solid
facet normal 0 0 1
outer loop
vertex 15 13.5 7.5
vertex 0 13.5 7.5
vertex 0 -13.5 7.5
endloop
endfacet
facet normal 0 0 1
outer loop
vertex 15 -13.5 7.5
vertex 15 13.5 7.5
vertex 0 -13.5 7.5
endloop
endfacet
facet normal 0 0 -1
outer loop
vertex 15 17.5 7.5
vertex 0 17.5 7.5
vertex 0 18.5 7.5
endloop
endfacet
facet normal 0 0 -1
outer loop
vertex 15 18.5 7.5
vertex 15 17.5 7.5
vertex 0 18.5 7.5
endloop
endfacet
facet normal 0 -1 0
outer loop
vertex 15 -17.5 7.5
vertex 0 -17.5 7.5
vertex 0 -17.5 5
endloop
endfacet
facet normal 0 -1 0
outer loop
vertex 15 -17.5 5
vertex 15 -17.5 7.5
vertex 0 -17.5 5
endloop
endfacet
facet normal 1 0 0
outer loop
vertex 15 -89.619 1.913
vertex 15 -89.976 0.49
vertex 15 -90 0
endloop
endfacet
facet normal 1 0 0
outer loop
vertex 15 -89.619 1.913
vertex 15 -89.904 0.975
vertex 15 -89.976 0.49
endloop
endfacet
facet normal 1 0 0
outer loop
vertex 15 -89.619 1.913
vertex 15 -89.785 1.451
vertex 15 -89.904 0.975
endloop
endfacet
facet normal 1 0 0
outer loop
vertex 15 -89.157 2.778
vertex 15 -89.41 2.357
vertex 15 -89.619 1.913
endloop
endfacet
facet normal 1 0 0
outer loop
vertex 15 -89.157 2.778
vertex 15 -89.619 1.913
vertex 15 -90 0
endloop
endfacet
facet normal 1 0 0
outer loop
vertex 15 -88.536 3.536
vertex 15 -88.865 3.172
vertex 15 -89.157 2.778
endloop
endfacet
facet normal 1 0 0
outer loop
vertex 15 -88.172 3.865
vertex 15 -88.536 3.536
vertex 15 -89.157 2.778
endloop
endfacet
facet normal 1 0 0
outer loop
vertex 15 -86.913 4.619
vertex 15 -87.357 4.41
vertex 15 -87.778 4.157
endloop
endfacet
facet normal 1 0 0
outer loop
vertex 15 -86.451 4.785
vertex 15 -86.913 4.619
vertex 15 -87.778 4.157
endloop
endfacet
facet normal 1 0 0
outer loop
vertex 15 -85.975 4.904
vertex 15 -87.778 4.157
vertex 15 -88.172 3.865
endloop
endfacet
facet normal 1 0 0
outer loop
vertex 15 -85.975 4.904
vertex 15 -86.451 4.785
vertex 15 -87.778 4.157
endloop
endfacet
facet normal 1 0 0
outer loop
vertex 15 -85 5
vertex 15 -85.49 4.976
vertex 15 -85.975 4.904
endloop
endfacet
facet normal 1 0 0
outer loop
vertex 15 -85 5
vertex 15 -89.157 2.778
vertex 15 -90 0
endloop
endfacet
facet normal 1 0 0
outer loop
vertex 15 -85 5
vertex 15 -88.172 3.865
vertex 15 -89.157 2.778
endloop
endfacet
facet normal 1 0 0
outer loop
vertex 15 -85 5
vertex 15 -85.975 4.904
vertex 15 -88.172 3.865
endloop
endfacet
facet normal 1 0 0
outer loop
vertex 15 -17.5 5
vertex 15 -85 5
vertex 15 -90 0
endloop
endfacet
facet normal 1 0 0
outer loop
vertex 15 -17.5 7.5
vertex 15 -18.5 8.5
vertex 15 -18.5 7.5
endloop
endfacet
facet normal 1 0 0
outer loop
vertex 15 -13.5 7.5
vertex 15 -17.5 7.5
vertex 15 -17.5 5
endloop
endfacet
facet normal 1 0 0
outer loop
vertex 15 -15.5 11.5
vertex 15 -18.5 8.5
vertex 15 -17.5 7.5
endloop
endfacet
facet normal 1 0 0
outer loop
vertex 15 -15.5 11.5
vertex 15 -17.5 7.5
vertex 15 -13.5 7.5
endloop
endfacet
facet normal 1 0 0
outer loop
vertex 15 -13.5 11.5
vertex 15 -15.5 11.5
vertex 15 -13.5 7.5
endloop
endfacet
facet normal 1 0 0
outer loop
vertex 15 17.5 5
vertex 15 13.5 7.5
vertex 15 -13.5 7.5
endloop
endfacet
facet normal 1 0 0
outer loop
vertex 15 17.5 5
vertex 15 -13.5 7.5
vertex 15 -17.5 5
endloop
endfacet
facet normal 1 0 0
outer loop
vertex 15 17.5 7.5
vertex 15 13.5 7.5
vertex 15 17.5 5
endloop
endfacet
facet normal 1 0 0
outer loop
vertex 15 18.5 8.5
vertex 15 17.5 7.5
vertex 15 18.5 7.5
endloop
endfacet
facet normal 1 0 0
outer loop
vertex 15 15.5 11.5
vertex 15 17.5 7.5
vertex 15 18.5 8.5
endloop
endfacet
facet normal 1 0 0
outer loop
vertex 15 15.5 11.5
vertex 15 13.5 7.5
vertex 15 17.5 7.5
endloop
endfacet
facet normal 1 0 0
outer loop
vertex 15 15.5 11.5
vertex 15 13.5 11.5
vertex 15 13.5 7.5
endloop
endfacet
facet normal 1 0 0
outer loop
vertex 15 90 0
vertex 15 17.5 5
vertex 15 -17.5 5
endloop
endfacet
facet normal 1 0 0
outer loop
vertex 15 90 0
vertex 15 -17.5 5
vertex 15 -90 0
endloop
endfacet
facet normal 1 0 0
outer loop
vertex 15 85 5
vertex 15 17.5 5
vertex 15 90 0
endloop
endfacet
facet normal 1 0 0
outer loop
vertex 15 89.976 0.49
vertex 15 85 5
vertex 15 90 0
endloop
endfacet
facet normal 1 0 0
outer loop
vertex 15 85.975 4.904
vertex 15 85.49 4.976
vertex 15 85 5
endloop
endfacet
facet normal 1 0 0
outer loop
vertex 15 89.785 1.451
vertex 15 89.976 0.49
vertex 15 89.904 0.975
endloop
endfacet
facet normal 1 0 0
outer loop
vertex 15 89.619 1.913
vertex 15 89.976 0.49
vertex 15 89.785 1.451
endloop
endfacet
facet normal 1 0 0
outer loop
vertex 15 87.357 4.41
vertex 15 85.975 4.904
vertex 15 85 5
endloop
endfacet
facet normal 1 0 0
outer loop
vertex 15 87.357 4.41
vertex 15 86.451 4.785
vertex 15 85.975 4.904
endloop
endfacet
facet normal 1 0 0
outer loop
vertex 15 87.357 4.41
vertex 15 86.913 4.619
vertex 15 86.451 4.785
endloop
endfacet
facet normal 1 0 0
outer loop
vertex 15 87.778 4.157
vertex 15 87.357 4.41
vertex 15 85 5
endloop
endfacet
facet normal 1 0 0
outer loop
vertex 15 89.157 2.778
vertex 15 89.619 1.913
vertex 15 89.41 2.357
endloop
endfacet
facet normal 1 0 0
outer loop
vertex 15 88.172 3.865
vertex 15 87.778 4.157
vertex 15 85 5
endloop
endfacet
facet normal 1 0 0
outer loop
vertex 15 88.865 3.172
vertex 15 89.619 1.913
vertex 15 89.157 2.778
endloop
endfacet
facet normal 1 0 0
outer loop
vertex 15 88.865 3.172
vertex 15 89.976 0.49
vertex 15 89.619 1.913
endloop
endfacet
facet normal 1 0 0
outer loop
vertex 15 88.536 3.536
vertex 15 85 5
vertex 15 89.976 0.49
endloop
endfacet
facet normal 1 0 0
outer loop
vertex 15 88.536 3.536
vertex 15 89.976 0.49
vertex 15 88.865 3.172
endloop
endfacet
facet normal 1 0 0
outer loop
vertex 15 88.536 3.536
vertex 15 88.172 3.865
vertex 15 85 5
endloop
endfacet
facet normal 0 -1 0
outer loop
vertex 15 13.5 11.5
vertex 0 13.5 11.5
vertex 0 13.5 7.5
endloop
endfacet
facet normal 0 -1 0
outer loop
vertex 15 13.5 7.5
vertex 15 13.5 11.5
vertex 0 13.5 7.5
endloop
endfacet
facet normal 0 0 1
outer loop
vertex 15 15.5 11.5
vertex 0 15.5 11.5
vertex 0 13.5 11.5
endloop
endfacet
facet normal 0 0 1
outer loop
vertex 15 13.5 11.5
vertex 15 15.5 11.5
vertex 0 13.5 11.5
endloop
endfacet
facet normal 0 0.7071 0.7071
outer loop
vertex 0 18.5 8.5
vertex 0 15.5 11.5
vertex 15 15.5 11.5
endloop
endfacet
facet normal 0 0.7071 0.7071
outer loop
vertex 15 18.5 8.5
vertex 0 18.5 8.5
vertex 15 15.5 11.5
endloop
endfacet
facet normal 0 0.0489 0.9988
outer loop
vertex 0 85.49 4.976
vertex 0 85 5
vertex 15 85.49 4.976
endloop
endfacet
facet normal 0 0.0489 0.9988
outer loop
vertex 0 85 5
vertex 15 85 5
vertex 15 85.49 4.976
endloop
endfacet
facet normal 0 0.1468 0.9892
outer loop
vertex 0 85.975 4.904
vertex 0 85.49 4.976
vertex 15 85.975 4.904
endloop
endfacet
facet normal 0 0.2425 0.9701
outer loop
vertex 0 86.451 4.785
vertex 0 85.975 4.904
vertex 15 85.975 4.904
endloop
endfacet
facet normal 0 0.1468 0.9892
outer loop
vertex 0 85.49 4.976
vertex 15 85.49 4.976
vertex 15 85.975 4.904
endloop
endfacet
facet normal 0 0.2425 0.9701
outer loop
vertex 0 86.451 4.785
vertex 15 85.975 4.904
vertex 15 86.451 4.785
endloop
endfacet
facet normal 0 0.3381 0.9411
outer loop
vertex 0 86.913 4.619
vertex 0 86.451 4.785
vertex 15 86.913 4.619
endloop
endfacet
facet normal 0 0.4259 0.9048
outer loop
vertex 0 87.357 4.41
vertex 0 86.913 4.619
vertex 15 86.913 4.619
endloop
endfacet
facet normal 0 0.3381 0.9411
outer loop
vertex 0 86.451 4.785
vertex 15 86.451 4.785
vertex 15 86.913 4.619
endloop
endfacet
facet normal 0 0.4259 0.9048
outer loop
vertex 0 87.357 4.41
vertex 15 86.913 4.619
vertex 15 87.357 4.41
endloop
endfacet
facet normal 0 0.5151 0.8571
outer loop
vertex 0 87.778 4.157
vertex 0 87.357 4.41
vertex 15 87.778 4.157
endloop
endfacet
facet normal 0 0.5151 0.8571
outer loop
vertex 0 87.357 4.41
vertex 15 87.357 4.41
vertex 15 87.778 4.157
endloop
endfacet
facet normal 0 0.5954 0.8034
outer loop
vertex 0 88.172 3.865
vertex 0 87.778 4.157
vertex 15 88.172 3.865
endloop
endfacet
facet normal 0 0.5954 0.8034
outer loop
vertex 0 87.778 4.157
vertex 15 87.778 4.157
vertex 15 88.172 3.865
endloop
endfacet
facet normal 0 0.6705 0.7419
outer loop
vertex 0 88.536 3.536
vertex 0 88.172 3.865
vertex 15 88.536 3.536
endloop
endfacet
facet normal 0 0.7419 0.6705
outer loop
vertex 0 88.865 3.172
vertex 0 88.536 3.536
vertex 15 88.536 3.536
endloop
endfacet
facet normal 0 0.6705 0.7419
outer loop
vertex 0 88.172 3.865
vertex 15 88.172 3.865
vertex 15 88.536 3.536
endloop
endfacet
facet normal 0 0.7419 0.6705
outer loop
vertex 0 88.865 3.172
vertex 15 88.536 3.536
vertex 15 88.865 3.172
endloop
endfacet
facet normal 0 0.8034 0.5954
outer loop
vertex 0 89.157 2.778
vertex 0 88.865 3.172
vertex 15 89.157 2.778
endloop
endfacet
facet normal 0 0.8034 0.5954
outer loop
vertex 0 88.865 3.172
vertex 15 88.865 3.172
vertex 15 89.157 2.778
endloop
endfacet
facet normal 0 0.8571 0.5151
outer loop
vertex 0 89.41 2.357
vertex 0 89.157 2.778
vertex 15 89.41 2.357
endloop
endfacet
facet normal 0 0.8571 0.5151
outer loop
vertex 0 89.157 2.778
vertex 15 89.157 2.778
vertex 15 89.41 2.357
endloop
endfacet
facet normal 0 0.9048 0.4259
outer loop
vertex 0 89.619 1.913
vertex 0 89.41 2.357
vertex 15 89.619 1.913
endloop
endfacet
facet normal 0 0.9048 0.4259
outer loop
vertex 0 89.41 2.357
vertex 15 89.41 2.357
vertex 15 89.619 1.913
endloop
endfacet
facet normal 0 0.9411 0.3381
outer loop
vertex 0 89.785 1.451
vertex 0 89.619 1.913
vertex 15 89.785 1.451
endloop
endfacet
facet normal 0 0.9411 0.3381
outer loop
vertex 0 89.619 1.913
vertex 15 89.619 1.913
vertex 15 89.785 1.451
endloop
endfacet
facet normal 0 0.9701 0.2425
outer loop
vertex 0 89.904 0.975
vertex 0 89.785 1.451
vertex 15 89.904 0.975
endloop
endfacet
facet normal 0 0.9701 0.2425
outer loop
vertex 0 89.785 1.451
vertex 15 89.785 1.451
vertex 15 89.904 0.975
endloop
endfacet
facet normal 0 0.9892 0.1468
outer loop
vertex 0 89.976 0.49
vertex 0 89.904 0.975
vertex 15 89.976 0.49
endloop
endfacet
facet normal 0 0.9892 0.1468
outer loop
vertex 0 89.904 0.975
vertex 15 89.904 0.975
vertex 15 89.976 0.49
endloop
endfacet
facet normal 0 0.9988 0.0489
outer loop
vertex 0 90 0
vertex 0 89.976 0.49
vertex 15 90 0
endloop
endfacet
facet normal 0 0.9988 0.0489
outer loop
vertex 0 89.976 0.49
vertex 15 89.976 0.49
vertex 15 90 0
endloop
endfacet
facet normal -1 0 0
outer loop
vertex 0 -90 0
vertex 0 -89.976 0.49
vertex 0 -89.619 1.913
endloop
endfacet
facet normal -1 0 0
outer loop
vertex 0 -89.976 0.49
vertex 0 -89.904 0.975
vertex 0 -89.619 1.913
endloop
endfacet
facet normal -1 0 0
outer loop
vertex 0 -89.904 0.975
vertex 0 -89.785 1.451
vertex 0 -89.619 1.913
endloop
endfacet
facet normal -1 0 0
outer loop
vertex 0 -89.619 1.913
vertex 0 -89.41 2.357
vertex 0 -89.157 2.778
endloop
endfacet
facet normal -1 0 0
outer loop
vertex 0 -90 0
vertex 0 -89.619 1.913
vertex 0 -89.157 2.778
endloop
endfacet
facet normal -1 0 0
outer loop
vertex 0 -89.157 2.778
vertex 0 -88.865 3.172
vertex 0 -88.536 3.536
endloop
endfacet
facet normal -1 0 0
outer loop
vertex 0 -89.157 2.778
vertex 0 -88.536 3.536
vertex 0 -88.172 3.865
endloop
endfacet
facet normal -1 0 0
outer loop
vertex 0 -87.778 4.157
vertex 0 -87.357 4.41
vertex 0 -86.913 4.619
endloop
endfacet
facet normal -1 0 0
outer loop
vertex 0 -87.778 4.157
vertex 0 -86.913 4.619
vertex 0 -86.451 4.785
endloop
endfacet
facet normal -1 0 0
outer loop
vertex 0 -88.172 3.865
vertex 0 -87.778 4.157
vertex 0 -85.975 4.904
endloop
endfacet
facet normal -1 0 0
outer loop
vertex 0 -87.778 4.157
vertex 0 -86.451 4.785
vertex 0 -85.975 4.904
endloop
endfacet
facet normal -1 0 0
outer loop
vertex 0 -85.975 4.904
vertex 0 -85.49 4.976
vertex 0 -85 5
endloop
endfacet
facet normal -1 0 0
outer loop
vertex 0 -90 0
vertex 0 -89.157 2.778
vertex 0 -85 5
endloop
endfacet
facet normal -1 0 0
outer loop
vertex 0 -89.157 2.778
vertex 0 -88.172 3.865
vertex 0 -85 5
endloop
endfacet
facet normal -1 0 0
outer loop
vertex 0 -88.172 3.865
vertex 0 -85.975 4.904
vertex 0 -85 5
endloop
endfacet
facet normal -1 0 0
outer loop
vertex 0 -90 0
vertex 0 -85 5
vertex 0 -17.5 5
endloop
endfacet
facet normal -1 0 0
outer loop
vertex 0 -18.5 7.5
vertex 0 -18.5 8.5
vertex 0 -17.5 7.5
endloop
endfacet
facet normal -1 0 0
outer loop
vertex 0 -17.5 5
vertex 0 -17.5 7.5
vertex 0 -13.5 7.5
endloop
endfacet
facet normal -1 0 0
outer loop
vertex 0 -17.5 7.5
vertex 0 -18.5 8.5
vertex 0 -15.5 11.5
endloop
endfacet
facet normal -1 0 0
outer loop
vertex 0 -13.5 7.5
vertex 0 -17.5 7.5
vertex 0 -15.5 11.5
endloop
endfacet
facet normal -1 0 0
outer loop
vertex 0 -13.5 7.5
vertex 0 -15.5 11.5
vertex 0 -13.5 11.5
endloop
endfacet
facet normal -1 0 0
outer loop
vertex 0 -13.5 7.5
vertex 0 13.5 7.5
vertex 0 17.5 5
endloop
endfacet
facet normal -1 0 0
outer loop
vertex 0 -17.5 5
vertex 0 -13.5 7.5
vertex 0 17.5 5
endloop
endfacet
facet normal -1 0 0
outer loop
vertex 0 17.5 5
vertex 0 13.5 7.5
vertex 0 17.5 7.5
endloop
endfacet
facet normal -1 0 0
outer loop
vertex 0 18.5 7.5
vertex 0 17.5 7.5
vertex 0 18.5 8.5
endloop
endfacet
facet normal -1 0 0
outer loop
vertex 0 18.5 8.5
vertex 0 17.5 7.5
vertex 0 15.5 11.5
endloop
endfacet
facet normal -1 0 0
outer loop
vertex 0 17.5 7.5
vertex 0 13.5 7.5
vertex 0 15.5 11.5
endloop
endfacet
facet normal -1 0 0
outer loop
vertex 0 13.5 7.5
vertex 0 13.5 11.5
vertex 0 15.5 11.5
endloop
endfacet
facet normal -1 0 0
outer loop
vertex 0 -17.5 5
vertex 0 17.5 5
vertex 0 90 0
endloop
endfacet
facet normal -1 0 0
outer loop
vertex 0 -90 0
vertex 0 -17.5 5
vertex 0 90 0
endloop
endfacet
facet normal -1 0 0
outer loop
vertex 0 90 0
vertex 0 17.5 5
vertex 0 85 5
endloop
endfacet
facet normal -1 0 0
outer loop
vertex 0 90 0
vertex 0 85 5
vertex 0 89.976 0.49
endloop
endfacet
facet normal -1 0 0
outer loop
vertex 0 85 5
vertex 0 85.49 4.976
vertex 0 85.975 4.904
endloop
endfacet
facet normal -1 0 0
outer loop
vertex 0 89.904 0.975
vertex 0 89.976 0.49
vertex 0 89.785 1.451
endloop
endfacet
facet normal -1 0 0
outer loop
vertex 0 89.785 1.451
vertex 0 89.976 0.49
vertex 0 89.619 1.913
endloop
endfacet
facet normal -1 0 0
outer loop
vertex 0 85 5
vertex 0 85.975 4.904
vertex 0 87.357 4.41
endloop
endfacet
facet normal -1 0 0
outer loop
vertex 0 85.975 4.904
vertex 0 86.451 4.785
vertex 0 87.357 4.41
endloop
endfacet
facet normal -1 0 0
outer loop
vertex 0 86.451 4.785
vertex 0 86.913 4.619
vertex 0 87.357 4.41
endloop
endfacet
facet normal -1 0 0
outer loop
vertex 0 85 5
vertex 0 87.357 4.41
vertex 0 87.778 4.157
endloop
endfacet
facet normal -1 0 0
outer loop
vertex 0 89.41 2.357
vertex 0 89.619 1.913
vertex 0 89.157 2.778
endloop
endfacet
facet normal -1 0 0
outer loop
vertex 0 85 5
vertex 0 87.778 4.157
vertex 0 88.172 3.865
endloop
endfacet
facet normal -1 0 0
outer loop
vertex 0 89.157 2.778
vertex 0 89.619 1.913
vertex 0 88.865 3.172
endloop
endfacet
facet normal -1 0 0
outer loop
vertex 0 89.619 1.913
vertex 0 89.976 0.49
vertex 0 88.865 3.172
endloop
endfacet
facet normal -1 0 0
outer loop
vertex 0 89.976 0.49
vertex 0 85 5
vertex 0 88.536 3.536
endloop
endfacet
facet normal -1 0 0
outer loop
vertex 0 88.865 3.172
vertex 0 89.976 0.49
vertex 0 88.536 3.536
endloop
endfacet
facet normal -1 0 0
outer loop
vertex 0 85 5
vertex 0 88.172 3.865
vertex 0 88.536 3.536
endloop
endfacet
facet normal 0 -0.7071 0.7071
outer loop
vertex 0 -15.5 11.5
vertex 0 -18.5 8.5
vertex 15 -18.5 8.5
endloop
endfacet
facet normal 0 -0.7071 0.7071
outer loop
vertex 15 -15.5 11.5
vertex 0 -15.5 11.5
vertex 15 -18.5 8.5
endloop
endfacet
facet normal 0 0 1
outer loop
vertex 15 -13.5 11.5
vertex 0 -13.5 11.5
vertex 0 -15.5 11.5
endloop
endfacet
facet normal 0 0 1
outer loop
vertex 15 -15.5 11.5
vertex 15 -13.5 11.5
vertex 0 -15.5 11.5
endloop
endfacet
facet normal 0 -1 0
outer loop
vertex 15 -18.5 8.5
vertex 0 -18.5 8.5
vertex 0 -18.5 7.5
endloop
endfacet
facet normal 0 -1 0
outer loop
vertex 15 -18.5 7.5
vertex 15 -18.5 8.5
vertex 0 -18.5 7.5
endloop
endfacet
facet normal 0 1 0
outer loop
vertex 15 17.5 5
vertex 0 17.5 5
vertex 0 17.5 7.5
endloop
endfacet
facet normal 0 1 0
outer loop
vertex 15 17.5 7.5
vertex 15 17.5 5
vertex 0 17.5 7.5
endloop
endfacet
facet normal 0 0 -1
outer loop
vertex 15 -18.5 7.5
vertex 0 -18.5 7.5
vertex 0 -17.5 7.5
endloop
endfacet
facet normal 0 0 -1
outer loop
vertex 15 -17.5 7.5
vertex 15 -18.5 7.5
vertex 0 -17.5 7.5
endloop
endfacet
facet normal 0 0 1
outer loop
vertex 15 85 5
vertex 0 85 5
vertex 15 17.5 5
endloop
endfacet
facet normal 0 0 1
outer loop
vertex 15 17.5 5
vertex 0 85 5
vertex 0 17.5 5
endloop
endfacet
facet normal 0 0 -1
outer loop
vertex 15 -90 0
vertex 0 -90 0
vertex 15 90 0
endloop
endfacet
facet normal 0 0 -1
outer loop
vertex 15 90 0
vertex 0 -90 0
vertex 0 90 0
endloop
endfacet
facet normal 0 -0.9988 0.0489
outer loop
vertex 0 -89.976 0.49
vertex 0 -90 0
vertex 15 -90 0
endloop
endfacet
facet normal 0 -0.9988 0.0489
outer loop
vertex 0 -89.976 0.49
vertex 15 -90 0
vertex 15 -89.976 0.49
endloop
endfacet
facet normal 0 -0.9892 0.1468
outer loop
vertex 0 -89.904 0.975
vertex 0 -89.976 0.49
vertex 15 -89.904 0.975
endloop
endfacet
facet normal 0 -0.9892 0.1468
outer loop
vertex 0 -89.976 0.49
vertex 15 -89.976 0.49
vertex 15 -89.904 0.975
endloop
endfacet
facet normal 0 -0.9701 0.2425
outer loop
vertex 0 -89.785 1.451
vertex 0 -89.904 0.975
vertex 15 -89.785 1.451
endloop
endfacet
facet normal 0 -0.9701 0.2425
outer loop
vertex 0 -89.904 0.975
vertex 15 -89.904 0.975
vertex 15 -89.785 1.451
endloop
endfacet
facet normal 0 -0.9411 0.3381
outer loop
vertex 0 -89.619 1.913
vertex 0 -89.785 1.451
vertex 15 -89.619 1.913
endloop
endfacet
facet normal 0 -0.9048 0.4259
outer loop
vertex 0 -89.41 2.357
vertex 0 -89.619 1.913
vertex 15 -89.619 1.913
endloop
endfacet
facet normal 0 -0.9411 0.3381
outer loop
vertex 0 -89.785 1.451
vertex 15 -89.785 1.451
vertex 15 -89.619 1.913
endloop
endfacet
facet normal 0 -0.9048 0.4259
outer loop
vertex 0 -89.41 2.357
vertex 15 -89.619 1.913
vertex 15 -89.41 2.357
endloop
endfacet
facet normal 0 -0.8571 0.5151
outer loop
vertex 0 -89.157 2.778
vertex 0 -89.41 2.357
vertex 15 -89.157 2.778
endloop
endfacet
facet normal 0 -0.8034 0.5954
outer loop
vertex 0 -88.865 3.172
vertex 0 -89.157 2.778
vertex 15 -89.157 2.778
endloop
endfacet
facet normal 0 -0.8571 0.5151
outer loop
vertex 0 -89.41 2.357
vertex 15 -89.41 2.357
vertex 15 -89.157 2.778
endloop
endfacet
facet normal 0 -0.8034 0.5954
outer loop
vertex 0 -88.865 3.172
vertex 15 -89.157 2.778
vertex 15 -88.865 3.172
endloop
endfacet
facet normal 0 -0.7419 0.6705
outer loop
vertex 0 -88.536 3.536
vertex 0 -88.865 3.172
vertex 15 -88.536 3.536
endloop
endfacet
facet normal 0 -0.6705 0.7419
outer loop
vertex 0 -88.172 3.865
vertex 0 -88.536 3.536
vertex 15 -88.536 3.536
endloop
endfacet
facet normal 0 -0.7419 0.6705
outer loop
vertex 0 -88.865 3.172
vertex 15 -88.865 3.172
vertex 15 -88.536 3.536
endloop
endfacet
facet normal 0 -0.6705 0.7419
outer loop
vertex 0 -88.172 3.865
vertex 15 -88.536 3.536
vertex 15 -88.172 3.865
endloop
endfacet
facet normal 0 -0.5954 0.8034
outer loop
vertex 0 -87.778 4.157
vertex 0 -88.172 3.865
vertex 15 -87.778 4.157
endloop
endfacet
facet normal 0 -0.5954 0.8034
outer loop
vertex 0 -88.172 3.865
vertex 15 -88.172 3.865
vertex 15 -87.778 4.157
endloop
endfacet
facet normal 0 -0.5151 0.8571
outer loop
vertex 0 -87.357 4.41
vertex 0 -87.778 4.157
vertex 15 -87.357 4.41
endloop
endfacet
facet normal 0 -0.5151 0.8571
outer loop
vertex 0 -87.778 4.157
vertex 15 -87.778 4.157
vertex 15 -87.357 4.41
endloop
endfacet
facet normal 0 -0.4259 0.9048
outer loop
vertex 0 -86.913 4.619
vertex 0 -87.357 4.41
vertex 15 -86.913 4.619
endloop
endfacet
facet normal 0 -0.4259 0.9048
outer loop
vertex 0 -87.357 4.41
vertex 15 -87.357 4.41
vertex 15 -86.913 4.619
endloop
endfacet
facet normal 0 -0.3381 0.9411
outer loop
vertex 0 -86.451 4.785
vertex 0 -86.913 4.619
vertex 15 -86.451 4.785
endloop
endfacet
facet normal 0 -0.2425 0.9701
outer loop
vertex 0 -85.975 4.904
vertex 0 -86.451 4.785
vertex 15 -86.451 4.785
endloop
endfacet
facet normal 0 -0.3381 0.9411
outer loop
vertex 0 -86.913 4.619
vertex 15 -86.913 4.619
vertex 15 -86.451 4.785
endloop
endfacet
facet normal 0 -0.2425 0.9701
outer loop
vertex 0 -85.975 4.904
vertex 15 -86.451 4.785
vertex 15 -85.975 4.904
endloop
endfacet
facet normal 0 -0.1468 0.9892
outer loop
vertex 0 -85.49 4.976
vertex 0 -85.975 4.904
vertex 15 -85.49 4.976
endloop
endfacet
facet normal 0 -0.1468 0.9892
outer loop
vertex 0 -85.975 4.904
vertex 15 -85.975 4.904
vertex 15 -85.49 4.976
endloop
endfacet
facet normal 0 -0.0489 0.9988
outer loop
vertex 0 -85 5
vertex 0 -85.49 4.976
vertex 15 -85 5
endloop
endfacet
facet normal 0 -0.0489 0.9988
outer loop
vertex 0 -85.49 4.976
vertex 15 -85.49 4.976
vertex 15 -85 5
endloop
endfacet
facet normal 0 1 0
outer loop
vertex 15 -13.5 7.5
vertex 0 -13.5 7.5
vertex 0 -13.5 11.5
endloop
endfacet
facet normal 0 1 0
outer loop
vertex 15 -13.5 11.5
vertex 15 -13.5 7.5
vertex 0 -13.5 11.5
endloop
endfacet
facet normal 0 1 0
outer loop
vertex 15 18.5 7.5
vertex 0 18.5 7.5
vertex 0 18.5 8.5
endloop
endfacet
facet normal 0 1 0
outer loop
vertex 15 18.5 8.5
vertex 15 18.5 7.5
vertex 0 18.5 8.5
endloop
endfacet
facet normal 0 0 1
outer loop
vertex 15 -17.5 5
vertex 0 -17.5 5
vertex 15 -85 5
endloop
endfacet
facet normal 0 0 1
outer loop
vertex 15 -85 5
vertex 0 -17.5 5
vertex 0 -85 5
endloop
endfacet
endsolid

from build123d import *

# Parameters (mm, degrees)
F1_DEPTH = 15
F2_SIZE  = 3
F3_R     = 4.99999


# Not quite as in the source:
# - a fillet or chamfer is up to 0.001 mm smaller than in the source, because OpenCascade refuses the exact size


with BuildPart() as f1:
    # F0 (on Right) → F1 (new body)
    with BuildSketch(Plane.YZ):
        Polygon((13.5, 7.5), (17.5, 7.5), (18.5, 7.5), (18.5, 11.5), (13.5, 11.5), align=None)
        Polygon((-17.5, 5), (17.5, 5), (17.5, 7.5), (13.5, 7.5), (-13.5, 7.5), (-17.5, 7.5), align=None)
        Polygon((90, 0), (90, 5), (17.5, 5), (-17.5, 5), (-90, 5), (-90, 0), align=None)
        Polygon((-18.5, 7.5), (-17.5, 7.5), (-13.5, 7.5), (-13.5, 11.5), (-18.5, 11.5), align=None)
    extrude(amount=F1_DEPTH)

    # F2
    f2_edges = [f1.edges().sort_by_distance(p)[0] for p in [
        (7.5, -18.5, 11.5),
        (7.5, 18.5, 11.5),
    ]]
    chamfer(f2_edges, length=F2_SIZE)

    # F3 (radius 5 in the source; OpenCascade refuses exactly that, so slightly less here)
    f3_edges = [f1.edges().sort_by_distance(p)[0] for p in [
        (7.5, 90, 5),
        (7.5, -90, 5),
    ]]
    fillet(f3_edges, radius=F3_R)


solid = f1.part
